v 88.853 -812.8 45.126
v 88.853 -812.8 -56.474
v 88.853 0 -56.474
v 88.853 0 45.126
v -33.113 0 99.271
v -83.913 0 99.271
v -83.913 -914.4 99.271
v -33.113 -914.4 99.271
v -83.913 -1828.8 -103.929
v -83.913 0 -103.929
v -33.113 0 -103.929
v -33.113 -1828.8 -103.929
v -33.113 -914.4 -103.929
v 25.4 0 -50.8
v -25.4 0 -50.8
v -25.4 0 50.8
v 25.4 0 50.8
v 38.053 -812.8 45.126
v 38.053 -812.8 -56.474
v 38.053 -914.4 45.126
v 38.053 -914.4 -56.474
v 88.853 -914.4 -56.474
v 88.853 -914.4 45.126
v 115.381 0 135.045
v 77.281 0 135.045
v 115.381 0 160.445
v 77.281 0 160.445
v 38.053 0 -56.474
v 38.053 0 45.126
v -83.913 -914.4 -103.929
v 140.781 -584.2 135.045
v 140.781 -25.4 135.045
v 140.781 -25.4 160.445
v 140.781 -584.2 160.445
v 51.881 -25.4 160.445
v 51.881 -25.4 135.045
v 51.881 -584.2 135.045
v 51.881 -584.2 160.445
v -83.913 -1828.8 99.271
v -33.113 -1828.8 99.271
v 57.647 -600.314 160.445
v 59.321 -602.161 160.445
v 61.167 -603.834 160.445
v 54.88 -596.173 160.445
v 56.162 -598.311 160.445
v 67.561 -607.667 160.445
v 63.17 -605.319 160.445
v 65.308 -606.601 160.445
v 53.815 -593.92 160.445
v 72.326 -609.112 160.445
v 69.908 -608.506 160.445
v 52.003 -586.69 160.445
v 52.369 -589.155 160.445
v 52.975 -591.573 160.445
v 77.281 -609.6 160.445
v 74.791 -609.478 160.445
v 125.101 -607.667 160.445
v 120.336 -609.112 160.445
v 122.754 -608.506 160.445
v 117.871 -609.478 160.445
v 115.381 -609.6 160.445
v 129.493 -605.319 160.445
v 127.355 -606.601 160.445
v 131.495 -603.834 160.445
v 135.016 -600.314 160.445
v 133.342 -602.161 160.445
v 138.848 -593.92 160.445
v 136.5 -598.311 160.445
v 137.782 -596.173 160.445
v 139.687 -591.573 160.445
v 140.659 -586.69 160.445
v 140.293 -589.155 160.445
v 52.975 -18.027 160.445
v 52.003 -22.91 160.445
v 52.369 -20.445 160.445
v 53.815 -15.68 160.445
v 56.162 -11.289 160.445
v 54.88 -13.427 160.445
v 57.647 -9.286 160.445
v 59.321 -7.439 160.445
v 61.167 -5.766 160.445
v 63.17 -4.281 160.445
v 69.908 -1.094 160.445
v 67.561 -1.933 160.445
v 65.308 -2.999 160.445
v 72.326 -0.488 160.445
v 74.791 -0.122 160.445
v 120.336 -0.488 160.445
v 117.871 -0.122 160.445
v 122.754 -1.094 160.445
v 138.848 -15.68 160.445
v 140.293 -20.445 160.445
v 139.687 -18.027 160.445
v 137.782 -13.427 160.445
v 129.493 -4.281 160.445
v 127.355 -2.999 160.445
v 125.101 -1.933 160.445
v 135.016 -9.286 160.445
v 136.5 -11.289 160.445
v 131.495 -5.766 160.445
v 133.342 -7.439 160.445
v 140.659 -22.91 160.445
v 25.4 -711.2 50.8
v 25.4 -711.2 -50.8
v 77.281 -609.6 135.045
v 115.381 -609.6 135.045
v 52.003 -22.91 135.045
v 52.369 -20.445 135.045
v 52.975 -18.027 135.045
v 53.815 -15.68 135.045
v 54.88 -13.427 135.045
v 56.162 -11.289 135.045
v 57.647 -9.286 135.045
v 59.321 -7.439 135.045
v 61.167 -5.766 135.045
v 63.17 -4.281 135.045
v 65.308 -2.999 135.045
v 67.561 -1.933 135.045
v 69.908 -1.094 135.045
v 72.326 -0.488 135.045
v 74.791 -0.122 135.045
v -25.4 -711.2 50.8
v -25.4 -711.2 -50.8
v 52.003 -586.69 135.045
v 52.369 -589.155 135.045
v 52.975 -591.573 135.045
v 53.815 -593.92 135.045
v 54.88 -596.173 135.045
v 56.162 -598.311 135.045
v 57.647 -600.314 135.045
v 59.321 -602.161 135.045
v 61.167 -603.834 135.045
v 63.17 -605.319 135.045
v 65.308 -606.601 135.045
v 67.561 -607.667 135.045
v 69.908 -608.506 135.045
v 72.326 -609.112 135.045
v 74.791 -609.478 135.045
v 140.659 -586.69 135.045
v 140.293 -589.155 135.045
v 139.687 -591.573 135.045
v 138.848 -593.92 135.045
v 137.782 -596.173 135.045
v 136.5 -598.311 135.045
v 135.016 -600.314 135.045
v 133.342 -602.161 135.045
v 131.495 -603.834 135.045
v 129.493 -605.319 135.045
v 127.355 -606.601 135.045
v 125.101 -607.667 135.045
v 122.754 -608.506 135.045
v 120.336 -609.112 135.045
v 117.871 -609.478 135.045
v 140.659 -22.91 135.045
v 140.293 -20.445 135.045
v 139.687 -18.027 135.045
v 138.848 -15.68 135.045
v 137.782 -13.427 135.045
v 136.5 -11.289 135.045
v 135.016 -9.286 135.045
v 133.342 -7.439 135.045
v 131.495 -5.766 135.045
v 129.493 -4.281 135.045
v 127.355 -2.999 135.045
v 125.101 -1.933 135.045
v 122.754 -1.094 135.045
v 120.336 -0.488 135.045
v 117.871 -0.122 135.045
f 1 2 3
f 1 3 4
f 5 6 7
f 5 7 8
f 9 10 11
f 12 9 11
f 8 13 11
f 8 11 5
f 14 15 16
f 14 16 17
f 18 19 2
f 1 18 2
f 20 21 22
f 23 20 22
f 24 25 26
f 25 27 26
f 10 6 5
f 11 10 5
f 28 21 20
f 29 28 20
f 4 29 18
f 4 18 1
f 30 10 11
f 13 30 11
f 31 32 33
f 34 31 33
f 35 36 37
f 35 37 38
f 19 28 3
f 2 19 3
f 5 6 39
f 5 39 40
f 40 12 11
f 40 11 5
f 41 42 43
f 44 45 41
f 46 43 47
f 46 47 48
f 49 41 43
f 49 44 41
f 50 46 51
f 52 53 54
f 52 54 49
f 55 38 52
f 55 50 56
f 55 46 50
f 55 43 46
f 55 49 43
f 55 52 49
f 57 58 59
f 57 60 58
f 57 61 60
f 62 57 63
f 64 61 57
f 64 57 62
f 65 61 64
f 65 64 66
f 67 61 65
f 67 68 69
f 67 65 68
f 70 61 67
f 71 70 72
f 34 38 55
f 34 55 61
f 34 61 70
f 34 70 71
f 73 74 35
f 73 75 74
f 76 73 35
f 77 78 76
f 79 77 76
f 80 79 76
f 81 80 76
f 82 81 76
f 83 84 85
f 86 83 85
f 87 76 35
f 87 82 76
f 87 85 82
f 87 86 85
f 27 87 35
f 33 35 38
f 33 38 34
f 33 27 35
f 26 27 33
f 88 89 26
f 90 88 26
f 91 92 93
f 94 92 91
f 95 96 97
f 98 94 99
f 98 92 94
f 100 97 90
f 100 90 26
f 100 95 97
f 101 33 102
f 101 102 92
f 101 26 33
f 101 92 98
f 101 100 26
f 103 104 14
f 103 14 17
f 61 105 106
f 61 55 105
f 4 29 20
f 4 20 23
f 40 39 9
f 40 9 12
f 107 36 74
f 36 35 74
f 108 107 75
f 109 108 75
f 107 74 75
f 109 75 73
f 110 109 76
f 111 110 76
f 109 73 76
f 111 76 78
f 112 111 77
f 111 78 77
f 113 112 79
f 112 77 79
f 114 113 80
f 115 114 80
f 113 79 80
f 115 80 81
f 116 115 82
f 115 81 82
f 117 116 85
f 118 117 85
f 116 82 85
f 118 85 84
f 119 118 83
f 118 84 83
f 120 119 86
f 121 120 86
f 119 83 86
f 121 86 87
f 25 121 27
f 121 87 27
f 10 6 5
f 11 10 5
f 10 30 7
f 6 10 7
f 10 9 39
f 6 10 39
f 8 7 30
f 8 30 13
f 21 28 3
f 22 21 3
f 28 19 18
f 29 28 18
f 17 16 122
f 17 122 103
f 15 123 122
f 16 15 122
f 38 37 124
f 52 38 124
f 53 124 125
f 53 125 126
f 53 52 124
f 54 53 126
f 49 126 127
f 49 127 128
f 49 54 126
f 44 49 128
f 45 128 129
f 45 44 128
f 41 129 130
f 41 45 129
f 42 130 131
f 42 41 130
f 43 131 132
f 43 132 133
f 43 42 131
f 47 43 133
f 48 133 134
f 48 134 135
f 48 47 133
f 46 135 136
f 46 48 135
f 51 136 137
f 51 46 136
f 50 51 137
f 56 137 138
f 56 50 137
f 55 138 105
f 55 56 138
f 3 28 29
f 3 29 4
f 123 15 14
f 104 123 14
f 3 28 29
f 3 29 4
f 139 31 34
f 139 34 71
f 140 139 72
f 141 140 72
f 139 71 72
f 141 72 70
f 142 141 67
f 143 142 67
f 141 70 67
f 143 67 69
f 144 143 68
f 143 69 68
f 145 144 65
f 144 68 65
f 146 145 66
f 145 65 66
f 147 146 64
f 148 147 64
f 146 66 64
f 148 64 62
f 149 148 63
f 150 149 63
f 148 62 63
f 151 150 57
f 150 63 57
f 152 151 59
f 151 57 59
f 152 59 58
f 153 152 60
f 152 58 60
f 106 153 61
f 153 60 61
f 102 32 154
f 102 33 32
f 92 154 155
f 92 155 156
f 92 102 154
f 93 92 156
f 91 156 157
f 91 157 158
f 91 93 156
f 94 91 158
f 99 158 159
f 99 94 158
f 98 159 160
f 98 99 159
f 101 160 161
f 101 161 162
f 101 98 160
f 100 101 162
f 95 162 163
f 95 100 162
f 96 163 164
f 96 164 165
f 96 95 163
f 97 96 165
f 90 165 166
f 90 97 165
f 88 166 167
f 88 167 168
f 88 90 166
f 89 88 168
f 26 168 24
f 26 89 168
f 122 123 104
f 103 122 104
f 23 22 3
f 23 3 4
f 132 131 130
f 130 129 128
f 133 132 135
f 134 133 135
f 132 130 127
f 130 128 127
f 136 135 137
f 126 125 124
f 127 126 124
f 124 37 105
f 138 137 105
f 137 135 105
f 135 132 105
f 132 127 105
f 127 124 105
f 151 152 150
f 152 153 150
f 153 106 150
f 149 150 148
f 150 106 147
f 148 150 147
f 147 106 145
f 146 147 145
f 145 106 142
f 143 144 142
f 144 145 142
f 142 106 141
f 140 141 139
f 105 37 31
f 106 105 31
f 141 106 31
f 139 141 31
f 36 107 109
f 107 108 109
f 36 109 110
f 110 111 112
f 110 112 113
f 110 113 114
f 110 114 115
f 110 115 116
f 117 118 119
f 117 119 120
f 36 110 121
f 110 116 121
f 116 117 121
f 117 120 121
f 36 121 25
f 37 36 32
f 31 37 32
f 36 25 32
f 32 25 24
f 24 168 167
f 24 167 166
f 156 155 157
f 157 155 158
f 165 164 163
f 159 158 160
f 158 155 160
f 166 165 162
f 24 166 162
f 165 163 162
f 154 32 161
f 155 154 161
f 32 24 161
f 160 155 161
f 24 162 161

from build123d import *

# Parameters (mm, degrees)
F0_W     = 50.8
F0_H     = 101.6
F1_DEPTH = 711.2
F2_W     = 50.8
F2_H     = 101.6
F3_DEPTH = 812.8
F4_W     = 50.8
F4_H     = 203.2
F5_DEPTH = 914.4
F6_DEPTH = 1828.8
F7_DEPTH = 914.4
F8_W     = 88.9
F8_H     = 25.4
F9_DEPTH = 609.6
F10_R    = 25.4


with BuildPart() as f1:
    # F0 (on Front) → F1 (new body)
    with BuildSketch(Plane.XZ):
        Rectangle(F0_W, F0_H)
    extrude(amount=F1_DEPTH)


with BuildPart() as f3:
    # F2 (on Front) → F3 (new body)
    with BuildSketch(Plane.XZ):
        with Locations((63.45287, -5.673663)):
            Rectangle(F2_W, F2_H)
    extrude(amount=F3_DEPTH)


with BuildPart() as f5:
    # F4 (on Front) → F5 (new body)
    with BuildSketch(Plane.XZ):
        with Locations((-58.513474, -2.32867)):
            Rectangle(F4_W, F4_H)
    extrude(amount=F5_DEPTH)


with BuildPart() as f6:
    # F4 (on Front) → F6 (new body)
    with BuildSketch(Plane.XZ):
        with Locations((-58.513474, -2.32867)):
            Rectangle(F4_W, F4_H)
    extrude(amount=F6_DEPTH)


with BuildPart() as f7:
    # F2 (on Front) → F7 (new body)
    with BuildSketch(Plane.XZ):
        with Locations((63.45287, -5.673663)):
            Rectangle(F2_W, F2_H)
    extrude(amount=F7_DEPTH)


with BuildPart() as f9:
    # F8 (on Front) → F9 (new body)
    with BuildSketch(Plane.XZ):
        with Locations((96.331083, 147.745244)):
            Rectangle(F8_W, F8_H)
    extrude(amount=F9_DEPTH)

    # F10
    f10_edges = [f9.edges().sort_by_distance(p)[0] for p in [
        (140.781083, 0, 147.745244),
        (51.881083, 0, 147.745244),
        (51.881083, -609.6, 147.745244),
        (140.781083, -609.6, 147.745244),
    ]]
    fillet(f10_edges, radius=F10_R)


solid = Compound([f1.part, f3.part, f5.part, f6.part, f7.part, f9.part])
